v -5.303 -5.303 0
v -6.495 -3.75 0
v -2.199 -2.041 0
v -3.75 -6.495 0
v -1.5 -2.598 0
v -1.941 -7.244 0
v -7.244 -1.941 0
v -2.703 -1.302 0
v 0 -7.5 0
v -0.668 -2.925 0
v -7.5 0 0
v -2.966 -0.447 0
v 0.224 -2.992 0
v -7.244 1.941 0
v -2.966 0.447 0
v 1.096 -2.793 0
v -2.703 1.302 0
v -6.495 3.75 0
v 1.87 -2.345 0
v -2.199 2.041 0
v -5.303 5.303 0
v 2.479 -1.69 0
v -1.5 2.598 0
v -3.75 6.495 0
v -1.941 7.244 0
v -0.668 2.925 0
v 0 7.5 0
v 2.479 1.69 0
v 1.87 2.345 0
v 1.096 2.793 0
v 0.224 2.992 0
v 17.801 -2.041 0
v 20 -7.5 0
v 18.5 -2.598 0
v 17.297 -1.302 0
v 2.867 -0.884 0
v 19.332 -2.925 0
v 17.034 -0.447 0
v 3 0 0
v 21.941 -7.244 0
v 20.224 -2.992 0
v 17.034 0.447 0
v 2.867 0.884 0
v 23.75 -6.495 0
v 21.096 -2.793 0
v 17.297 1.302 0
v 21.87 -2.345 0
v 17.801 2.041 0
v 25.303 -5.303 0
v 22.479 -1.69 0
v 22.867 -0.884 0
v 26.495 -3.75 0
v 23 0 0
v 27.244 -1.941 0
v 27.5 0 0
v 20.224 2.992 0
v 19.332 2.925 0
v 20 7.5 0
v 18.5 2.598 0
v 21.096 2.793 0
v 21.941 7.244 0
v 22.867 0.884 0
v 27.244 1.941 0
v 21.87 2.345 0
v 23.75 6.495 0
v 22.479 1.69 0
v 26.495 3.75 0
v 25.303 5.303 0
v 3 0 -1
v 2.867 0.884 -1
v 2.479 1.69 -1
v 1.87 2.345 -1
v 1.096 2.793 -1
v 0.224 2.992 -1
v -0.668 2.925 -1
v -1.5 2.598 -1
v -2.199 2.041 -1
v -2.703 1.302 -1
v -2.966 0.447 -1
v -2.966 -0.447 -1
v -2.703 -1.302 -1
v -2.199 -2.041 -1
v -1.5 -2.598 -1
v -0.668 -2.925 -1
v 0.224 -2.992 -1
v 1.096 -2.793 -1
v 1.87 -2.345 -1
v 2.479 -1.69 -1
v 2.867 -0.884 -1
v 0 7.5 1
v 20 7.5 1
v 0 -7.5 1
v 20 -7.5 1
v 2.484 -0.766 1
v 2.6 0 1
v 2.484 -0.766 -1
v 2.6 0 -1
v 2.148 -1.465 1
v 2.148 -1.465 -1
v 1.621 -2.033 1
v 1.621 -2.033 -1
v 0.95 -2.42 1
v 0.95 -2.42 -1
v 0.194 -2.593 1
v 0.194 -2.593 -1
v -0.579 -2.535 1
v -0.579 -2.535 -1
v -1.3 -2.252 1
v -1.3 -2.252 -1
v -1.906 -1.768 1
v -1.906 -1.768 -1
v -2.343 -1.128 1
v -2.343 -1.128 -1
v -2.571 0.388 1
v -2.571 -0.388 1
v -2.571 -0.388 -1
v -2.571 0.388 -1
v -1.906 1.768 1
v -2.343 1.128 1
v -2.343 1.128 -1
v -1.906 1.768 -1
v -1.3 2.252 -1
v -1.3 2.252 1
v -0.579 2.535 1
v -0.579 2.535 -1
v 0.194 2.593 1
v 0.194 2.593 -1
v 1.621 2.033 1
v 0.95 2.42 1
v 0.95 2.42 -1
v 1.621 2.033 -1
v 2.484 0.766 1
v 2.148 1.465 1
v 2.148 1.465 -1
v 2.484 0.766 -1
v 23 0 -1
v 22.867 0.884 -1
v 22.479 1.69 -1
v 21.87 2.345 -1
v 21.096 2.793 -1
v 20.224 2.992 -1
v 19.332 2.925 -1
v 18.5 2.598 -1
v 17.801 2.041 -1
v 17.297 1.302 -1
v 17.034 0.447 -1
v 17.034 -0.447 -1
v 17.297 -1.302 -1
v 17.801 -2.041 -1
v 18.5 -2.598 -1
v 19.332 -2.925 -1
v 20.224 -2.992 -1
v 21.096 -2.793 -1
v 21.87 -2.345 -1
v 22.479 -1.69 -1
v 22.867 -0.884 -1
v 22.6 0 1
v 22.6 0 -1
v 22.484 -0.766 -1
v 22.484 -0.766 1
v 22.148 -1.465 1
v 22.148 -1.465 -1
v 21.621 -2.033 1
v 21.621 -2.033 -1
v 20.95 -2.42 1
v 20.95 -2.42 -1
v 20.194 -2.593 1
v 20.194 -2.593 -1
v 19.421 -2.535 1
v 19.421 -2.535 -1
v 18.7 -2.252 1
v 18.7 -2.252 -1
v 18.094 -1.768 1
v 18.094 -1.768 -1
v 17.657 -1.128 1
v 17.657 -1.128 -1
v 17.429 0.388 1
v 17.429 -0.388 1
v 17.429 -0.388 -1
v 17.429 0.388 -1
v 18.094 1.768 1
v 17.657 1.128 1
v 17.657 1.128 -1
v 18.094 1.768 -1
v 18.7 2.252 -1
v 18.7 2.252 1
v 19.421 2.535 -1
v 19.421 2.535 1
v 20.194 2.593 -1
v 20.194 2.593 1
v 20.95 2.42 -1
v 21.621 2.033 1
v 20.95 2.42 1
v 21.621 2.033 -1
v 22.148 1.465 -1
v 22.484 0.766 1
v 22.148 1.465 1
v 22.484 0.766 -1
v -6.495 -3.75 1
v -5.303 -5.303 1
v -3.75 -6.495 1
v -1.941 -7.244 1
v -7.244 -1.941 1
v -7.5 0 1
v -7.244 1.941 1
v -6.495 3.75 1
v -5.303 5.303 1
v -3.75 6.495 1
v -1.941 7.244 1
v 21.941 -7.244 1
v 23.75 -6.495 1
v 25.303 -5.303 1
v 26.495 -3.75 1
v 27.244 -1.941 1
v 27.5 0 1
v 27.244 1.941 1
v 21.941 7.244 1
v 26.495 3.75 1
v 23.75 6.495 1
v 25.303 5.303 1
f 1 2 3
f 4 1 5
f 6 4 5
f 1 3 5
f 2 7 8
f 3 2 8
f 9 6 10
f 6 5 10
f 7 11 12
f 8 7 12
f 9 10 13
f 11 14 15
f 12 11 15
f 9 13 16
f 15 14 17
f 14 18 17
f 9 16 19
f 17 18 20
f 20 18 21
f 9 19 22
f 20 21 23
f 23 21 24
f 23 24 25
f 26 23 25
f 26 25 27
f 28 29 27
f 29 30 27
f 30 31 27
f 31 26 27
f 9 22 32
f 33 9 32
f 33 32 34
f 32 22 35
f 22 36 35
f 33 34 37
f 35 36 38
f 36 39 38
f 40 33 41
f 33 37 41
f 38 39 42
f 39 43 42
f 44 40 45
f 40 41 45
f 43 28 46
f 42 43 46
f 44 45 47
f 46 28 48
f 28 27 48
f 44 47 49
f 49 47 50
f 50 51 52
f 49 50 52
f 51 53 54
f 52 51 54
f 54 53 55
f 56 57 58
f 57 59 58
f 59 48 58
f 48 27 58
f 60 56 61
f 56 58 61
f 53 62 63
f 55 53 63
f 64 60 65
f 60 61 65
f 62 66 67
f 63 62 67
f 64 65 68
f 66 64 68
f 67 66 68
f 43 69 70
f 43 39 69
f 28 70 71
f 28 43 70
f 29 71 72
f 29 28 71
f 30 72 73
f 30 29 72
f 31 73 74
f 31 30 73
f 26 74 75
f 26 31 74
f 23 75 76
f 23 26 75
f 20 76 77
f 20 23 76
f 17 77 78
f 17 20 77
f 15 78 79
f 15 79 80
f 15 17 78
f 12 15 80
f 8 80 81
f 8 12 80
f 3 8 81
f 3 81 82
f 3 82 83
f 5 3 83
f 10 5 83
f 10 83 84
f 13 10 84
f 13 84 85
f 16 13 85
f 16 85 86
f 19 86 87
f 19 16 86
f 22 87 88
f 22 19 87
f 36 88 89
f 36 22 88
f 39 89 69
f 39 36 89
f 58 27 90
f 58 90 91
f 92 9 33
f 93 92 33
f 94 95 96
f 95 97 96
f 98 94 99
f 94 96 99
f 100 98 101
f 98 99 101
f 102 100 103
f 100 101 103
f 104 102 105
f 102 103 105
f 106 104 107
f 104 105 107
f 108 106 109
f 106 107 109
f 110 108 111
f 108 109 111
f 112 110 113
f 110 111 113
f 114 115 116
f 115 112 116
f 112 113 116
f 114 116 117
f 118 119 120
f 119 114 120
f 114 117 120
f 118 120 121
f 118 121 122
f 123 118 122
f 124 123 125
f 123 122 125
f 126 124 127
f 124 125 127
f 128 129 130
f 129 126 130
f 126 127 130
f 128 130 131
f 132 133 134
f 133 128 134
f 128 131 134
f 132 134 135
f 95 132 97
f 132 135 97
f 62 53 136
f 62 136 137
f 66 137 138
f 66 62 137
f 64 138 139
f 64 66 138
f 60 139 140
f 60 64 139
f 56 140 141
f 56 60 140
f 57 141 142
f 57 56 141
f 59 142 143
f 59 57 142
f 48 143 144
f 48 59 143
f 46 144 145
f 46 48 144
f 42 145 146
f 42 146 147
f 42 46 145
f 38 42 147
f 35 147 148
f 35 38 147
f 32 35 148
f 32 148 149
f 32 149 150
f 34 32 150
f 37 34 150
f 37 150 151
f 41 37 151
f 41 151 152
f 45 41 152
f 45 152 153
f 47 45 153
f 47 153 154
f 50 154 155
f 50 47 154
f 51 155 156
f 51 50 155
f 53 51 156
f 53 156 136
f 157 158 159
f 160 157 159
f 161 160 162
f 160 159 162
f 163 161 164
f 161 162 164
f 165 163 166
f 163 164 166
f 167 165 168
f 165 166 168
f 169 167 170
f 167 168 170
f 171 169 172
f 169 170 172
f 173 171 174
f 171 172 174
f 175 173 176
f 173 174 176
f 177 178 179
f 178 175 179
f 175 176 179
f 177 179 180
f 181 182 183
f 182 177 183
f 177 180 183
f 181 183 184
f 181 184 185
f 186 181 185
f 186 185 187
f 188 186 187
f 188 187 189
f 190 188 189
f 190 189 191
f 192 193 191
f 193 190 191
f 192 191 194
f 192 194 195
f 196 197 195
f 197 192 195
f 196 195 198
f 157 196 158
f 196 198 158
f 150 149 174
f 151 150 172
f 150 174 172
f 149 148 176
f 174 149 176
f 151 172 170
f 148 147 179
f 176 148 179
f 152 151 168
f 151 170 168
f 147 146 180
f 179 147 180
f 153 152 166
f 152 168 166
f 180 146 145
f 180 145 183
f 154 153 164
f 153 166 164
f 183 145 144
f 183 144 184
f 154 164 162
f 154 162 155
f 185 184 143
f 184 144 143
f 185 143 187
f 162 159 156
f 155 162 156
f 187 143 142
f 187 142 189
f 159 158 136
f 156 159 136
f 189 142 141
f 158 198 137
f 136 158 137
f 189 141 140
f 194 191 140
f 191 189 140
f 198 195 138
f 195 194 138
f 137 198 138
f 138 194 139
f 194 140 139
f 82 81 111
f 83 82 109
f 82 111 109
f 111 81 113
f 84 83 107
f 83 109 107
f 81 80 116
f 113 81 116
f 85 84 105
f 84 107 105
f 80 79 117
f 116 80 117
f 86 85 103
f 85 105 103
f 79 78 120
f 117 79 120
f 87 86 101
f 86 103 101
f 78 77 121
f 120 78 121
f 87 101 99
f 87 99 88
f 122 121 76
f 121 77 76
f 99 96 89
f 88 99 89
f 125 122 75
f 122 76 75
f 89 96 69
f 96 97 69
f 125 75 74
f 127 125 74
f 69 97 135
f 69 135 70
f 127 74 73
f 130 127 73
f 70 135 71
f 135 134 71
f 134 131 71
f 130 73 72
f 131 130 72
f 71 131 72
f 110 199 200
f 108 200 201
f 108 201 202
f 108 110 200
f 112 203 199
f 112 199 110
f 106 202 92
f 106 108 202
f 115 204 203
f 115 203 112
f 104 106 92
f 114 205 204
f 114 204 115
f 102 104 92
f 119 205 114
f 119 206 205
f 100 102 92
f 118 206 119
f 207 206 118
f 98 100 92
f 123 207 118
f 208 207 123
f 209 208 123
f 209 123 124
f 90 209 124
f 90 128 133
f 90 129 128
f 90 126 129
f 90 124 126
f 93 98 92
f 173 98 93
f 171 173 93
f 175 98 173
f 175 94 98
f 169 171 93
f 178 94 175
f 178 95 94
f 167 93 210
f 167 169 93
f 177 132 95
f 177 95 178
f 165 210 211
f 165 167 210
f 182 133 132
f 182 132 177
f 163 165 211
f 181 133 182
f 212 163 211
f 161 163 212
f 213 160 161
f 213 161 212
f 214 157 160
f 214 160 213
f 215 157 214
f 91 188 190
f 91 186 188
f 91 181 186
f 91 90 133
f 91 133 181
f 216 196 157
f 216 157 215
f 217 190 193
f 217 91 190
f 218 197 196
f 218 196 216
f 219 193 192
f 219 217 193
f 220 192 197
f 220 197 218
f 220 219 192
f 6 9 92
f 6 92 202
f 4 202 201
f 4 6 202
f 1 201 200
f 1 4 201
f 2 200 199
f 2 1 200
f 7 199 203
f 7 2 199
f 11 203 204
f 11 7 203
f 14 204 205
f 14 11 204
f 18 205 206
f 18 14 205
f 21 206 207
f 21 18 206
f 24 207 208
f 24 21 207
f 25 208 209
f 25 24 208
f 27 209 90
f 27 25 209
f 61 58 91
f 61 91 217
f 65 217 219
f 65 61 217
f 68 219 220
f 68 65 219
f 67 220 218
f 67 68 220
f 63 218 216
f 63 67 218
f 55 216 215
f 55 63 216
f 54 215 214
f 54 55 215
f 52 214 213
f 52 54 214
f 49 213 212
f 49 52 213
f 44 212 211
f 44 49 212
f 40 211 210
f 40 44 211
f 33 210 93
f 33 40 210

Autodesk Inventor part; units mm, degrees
ref_plane "YZ Plane" through (0, 0, 0) normal (1, 0, 0) x (0, 1, 0)
ref_plane "XZ Plane" through (0, 0, 0) normal (0, 1, 0) x (-1, 0, 0)
ref_plane "XY Plane" through (0, 0, 0) normal (0, 0, 1) x (1, 0, 0)
sketch "Sketch1" plane through (0, 0, 0) normal (0, 0, 1) x (1, 0, 0)
  circle A0 centre (0, 0) radius 7.5
  circle A1 centre (20, 0) radius 7.5
  line L0 (0, 7.5) -> (20, 7.5)
  line L1 (0, -7.5) -> (20, -7.5)
  circle A2 centre (0, 0) radius 3
  circle A3 centre (20, 0) radius 3
  circle A4 centre (20, 0) radius 2.6
  circle A5 centre (0, 0) radius 2.6
  dimension "d0" = 20
  dimension "d1" = 15
  dimension "d6" = 5.2
  dimension "d7" = 5.2
  dimension "d10" = 0.4
  dimension "d11" = 0.4
  dimension "d12" = 6
extrude "Extrusion1" add sketch "Sketch1" along normal blind 1 contours A0 | A0 L0 A1 L1 | A1 | A2 | A3
extrude "Extrusion2" add sketch "Sketch1" against normal blind 1 contours A2 | A3
equation "\"d6\" = d7"
equation "\"d11\" = d10"
properties part number "Belt Holder"
